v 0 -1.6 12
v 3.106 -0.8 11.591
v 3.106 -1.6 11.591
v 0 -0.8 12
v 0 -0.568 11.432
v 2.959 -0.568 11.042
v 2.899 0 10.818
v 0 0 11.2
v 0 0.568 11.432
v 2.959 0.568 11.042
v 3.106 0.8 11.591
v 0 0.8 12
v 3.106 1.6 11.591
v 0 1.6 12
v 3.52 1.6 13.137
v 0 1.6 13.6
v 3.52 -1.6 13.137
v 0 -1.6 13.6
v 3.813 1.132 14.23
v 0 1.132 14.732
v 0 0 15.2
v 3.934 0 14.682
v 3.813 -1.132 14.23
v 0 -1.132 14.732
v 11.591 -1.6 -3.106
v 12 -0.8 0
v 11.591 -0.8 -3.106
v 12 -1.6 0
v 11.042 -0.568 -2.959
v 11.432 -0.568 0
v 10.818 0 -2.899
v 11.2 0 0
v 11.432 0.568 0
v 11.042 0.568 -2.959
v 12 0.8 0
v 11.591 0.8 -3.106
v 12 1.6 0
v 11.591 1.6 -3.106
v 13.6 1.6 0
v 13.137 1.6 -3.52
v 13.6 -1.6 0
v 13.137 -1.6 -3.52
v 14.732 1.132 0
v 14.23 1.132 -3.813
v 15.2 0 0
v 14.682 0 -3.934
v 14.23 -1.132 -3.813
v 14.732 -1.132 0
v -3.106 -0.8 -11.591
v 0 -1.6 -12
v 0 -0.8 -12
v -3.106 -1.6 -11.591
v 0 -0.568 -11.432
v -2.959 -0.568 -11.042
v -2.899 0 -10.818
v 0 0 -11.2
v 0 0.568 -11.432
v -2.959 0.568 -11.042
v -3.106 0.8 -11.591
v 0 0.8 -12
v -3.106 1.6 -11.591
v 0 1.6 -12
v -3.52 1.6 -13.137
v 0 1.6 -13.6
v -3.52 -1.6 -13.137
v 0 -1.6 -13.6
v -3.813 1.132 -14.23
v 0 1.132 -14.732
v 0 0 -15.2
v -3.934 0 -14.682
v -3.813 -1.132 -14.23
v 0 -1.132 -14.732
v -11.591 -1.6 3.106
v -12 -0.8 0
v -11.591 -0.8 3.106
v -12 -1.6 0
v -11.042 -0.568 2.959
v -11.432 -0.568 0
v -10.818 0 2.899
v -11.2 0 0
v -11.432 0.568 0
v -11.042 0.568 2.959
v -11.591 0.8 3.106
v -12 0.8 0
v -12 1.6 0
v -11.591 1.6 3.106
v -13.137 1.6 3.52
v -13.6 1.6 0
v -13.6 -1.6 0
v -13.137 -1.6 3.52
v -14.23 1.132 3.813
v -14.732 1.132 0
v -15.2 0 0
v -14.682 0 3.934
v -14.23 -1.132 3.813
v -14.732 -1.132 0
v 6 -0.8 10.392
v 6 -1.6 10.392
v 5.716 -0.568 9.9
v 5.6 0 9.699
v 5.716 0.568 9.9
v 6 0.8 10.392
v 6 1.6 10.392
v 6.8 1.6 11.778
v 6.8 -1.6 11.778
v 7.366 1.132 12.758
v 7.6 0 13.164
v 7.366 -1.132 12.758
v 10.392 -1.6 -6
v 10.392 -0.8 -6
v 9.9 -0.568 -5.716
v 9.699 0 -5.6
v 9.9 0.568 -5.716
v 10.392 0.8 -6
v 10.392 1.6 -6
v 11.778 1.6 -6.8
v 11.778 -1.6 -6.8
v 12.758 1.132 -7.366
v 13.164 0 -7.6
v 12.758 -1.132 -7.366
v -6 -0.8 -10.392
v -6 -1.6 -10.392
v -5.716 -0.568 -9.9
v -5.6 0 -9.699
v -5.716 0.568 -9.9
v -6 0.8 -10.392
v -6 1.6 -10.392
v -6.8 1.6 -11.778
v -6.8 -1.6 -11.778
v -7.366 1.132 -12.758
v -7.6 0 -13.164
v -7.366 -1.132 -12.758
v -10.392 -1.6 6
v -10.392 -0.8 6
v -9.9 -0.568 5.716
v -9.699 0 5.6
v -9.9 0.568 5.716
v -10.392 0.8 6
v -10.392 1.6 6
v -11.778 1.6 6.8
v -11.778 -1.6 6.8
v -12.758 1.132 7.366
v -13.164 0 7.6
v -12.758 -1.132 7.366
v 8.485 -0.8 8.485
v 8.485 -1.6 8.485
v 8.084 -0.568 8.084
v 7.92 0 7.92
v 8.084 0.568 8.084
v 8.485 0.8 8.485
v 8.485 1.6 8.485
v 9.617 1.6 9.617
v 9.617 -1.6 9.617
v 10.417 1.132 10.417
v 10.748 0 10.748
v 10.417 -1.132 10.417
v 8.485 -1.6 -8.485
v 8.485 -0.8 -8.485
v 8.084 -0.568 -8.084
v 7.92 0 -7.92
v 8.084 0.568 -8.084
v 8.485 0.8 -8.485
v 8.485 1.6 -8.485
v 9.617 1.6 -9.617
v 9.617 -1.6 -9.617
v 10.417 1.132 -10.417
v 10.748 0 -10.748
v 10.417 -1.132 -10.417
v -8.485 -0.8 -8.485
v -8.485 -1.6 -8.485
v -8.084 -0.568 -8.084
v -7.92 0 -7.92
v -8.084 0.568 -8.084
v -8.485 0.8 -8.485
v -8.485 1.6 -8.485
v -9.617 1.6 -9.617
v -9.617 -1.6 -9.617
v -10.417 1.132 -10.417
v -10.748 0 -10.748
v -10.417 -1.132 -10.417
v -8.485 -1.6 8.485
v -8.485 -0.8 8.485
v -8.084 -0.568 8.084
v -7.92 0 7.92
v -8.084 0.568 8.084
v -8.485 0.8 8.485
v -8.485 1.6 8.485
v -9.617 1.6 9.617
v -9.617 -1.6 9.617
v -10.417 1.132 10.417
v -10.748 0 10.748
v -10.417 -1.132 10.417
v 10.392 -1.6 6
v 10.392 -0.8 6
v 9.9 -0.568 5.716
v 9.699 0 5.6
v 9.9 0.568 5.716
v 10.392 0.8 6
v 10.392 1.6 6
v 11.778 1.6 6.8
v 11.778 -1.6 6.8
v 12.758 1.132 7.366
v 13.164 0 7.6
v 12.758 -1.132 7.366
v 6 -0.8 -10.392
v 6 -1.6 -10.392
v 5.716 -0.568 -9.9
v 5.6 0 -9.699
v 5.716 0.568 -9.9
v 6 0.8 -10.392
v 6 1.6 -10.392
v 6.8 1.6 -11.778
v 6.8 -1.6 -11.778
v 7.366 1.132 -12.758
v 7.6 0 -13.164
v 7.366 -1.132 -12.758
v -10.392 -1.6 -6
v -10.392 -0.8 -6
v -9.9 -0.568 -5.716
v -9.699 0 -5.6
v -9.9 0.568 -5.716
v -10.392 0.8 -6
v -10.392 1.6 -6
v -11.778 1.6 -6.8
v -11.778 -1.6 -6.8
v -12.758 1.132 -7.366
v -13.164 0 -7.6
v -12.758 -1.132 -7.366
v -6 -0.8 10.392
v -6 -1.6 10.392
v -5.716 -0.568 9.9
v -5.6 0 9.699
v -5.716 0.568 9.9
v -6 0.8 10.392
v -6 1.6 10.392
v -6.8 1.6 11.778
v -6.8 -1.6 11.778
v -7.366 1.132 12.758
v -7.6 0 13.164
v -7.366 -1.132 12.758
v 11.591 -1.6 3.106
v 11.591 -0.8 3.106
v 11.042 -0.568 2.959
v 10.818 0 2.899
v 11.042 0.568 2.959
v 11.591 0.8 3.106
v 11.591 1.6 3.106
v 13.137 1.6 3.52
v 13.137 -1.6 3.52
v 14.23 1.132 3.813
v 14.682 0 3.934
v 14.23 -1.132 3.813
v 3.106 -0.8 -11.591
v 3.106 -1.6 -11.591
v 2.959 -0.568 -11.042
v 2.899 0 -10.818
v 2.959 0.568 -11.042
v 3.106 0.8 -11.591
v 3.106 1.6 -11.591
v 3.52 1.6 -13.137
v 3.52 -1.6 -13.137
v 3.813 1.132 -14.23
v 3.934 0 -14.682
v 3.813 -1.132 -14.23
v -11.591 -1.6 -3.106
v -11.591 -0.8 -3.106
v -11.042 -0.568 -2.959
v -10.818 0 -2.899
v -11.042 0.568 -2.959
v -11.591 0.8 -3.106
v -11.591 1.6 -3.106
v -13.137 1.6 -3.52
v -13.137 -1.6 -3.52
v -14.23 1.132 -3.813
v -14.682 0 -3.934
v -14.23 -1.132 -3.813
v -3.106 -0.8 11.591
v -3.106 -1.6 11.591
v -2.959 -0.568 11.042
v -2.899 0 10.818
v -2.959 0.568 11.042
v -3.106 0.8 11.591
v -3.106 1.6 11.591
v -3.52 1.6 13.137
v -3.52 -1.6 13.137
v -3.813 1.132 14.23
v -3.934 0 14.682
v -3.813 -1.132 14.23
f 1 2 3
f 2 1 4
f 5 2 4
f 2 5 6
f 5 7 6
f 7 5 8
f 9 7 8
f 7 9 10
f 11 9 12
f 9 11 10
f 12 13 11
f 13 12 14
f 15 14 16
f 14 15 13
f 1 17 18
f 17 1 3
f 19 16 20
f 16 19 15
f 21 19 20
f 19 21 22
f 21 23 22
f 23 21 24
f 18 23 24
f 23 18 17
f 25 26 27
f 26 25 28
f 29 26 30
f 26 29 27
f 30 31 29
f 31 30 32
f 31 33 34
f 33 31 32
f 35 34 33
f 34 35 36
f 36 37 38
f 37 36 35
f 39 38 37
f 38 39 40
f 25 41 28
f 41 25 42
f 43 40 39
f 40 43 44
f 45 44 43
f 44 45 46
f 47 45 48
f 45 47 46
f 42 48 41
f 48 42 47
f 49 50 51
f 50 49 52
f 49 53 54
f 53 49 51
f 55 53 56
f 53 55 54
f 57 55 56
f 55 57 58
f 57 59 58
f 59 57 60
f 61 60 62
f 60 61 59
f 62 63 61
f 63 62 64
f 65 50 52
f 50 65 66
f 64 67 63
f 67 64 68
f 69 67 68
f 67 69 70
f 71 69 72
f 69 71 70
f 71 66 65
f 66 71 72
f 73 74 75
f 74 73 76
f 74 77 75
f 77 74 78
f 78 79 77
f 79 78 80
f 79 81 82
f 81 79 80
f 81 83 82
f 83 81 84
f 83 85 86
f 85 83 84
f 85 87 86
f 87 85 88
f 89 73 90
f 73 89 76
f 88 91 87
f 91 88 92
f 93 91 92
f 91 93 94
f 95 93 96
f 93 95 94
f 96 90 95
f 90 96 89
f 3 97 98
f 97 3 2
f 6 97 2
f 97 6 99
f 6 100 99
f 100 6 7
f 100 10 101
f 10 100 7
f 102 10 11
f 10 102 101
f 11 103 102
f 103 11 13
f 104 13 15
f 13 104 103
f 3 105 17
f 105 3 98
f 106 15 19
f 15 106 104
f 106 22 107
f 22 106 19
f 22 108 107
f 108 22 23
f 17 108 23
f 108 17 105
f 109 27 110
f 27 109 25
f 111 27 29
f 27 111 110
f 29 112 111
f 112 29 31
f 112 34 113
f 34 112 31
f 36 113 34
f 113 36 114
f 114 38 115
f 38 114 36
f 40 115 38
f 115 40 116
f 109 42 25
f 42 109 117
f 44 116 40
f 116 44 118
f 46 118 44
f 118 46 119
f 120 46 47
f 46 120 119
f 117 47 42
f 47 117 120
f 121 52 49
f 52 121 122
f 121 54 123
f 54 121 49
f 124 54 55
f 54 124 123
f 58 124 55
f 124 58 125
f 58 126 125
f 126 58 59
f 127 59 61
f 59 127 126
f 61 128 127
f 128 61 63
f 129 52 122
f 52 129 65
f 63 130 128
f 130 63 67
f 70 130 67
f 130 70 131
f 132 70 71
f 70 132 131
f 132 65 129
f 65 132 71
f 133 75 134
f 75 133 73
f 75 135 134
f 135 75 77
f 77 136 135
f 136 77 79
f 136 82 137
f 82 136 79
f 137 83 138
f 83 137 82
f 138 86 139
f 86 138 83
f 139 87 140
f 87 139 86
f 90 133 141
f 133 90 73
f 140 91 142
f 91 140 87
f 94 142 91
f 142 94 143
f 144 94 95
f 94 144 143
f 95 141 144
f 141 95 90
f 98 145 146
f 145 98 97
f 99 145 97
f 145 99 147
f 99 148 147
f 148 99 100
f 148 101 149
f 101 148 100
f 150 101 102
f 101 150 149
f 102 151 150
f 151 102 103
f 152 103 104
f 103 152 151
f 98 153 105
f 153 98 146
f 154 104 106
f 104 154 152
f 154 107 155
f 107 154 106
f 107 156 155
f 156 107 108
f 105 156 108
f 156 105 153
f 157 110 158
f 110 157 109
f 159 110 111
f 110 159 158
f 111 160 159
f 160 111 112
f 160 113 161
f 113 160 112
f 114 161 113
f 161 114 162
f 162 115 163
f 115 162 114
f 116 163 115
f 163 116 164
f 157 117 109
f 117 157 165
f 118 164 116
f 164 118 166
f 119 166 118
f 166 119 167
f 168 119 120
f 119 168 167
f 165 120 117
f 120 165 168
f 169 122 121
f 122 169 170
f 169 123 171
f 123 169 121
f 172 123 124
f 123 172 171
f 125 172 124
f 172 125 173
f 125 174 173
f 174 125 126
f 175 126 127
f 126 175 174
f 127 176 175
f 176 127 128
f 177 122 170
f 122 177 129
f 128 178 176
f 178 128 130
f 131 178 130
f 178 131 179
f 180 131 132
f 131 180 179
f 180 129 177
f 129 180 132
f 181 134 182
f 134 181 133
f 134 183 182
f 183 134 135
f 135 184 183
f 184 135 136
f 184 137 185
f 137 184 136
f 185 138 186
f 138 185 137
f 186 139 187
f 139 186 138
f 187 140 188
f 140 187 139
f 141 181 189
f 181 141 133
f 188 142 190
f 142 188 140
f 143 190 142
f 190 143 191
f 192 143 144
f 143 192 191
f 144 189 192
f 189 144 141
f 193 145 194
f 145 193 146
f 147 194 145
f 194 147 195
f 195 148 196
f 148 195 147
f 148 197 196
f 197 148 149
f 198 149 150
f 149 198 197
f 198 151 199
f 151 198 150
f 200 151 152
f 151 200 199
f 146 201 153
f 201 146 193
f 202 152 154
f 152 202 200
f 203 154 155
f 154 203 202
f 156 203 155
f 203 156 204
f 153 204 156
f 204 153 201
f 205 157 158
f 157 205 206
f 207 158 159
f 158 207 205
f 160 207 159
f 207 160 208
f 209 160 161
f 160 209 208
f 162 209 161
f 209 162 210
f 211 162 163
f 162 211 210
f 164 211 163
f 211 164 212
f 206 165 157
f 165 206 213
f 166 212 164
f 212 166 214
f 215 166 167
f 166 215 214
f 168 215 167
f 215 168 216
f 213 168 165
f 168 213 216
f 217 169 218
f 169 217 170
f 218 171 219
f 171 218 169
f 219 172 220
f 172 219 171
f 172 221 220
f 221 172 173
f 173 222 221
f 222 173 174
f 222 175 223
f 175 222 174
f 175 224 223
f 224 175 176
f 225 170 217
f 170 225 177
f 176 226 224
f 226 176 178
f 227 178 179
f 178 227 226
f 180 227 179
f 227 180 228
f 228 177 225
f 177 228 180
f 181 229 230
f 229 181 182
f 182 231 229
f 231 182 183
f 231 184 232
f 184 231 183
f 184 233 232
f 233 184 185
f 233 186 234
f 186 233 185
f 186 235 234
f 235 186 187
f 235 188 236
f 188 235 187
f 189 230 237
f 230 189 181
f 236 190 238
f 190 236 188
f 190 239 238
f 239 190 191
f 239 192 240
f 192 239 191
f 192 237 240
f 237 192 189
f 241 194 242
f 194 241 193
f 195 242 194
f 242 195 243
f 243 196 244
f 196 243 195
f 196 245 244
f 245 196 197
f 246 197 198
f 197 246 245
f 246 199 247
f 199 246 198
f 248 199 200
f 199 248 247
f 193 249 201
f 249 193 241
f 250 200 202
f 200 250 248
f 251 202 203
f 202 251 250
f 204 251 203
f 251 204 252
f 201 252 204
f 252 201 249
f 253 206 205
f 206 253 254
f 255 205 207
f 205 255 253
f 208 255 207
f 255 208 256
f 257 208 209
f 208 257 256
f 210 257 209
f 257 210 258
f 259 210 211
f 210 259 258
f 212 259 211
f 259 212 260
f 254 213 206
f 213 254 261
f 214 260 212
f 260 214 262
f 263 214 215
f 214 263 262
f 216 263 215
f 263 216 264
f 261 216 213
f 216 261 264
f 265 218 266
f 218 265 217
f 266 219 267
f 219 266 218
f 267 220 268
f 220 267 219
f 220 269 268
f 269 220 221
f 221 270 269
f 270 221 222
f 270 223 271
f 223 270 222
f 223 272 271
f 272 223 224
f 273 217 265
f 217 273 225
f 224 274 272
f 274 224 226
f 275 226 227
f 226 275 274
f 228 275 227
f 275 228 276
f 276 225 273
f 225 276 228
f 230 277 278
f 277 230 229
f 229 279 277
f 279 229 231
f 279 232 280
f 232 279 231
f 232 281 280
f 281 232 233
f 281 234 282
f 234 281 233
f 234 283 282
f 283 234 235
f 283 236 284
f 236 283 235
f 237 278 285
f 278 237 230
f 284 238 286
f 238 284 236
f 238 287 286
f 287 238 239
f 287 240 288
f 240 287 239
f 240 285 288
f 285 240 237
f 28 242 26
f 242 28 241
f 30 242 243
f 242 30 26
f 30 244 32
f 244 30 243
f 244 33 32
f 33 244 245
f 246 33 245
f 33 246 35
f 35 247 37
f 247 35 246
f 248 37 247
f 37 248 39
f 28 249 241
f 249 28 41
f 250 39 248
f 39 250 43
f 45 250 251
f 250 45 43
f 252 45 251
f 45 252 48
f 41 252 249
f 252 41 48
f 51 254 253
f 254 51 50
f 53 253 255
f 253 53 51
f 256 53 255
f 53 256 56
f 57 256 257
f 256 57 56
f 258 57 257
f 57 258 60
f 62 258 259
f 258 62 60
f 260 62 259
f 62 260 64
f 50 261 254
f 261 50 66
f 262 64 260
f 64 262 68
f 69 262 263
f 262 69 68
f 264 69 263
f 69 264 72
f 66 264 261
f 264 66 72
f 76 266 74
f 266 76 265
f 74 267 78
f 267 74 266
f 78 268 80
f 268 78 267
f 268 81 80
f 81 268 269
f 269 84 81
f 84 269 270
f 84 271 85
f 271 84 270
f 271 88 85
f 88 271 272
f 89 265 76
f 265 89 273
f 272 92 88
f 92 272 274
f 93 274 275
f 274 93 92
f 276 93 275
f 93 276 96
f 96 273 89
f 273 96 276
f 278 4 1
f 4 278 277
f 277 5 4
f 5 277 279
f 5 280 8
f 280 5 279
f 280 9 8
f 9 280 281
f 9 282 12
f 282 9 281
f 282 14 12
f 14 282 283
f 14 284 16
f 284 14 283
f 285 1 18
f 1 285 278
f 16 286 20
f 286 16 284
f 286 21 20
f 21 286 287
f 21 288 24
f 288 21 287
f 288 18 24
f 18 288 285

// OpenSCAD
// file: ../p/4-4edge.scad
use <../lib.scad>
$fa=1; $fs=0.2;
function ldraw_lib__4_4edge(realsolid=false) = [
// 0 Circle 1.0
// 0 Name: 4-4edge.dat
// 0 Author: James Jessiman
// 0 !LDRAW_ORG Primitive UPDATE 2017-01
// 0 !LICENSE Licensed under CC BY 2.0 and CC BY 4.0 : see CAreadme.txt
// 
// 0 BFC CERTIFY CCW
  [0,"BFC","CERTIFY"],
  [0,"BFC","CCW"],
// 
// 0 !HISTORY 1998-12-15 [PTadmin] Official Update 1998-10
// 0 !HISTORY 2005-12-28 [PTadmin] Official Update 2005-01
// 0 !HISTORY 2007-06-24 [PTadmin] Header formatted for Contributor Agreement
// 0 !HISTORY 2008-07-01 [PTadmin] Official Update 2008-01
// 0 !HISTORY 2017-01-15 [Steffen] BFCed
// 0 !HISTORY 2017-12-30 [PTadmin] Official Update 2017-01
// 
// 
// 2 24 1 0 0 0.9239 0 0.3827
  [2,24,1,0,0,0.9239,0,0.3827],
// 2 24 0.9239 0 0.3827 0.7071 0 0.7071
  [2,24,0.9239,0,0.3827,0.7071,0,0.7071],
// 2 24 0.7071 0 0.7071 0.3827 0 0.9239
  [2,24,0.7071,0,0.7071,0.3827,0,0.9239],
// 2 24 0.3827 0 0.9239 0 0 1
  [2,24,0.3827,0,0.9239,0,0,1],
// 2 24 0 0 1 -0.3827 0 0.9239
  [2,24,0,0,1,-0.3827,0,0.9239],
// 2 24 -0.3827 0 0.9239 -0.7071 0 0.7071
  [2,24,-0.3827,0,0.9239,-0.7071,0,0.7071],
// 2 24 -0.7071 0 0.7071 -0.9239 0 0.3827
  [2,24,-0.7071,0,0.7071,-0.9239,0,0.3827],
// 2 24 -0.9239 0 0.3827 -1 0 -0
  [2,24,-0.9239,0,0.3827,-1,0,-0],
// 2 24 -1 0 -0 -0.9239 0 -0.3827
  [2,24,-1,0,-0,-0.9239,0,-0.3827],
// 2 24 -0.9239 0 -0.3827 -0.7071 0 -0.7071
  [2,24,-0.9239,0,-0.3827,-0.7071,0,-0.7071],
// 2 24 -0.7071 0 -0.7071 -0.3827 0 -0.9239
  [2,24,-0.7071,0,-0.7071,-0.3827,0,-0.9239],
// 2 24 -0.3827 0 -0.9239 0 0 -1
  [2,24,-0.3827,0,-0.9239,0,0,-1],
// 2 24 0 0 -1 0.3827 0 -0.9239
  [2,24,0,0,-1,0.3827,0,-0.9239],
// 2 24 0.3827 0 -0.9239 0.7071 0 -0.7071
  [2,24,0.3827,0,-0.9239,0.7071,0,-0.7071],
// 2 24 0.7071 0 -0.7071 0.9239 0 -0.3827
  [2,24,0.7071,0,-0.7071,0.9239,0,-0.3827],
// 2 24 0.9239 0 -0.3827 1 0 0
  [2,24,0.9239,0,-0.3827,1,0,0],
];
module ldraw_lib__4_4edge(step=0, col=false, unit=2/5, alt=false, line=0.2, solid=!$preview)
    makepoly(ldraw_lib__4_4edge(solid), step=step, col=col, unit=unit, alt=alt, line=line, solid=solid);
ldraw_lib__4_4edge(line=0.2);
// file: ../p/4-4disc.scad
use <../lib.scad>
$fa=1; $fs=0.2;
function ldraw_lib__4_4disc(realsolid=false) = [
// 0 Disc 1.0
// 0 Name: 4-4disc.dat
// 0 Author: James Jessiman
// 0 !LDRAW_ORG Primitive UPDATE 2002-02
// 0 !LICENSE Licensed under CC BY 2.0 and CC BY 4.0 : see CAreadme.txt
// 
// 0 BFC CERTIFY CCW
  [0,"BFC","CERTIFY"],
  [0,"BFC","CCW"],
// 
// 0 !HISTORY 1998-12-15 [PTadmin] Official Update 1998-10
// 0 !HISTORY 2002-03-23 [sbliss] Added BFC statement
// 0 !HISTORY 2002-04-25 [PTadmin] Official Update 2002-02
// 0 !HISTORY 2007-06-24 [PTadmin] Header formatted for Contributor Agreement
// 0 !HISTORY 2008-07-01 [PTadmin] Official Update 2008-01
// 
// 
// 3 16 0 0 0 1 0 0 0.9239 0 0.3827
  [3,16,0,0,0,1,0,0,0.9239,0,0.3827],
// 3 16 0 0 0 0.9239 0 0.3827 0.7071 0 0.7071
  [3,16,0,0,0,0.9239,0,0.3827,0.7071,0,0.7071],
// 3 16 0 0 0 0.7071 0 0.7071 0.3827 0 0.9239
  [3,16,0,0,0,0.7071,0,0.7071,0.3827,0,0.9239],
// 3 16 0 0 0 0.3827 0 0.9239 0 0 1
  [3,16,0,0,0,0.3827,0,0.9239,0,0,1],
// 3 16 0 0 0 0 0 1 -0.3827 0 0.9239
  [3,16,0,0,0,0,0,1,-0.3827,0,0.9239],
// 3 16 0 0 0 -0.3827 0 0.9239 -0.7071 0 0.7071
  [3,16,0,0,0,-0.3827,0,0.9239,-0.7071,0,0.7071],
// 3 16 0 0 0 -0.7071 0 0.7071 -0.9239 0 0.3827
  [3,16,0,0,0,-0.7071,0,0.7071,-0.9239,0,0.3827],
// 3 16 0 0 0 -0.9239 0 0.3827 -1 0 -0
  [3,16,0,0,0,-0.9239,0,0.3827,-1,0,-0],
// 3 16 0 0 0 -1 0 -0 -0.9239 0 -0.3827
  [3,16,0,0,0,-1,0,-0,-0.9239,0,-0.3827],
// 3 16 0 0 0 -0.9239 0 -0.3827 -0.7071 0 -0.7071
  [3,16,0,0,0,-0.9239,0,-0.3827,-0.7071,0,-0.7071],
// 3 16 0 0 0 -0.7071 0 -0.7071 -0.3827 0 -0.9239
  [3,16,0,0,0,-0.7071,0,-0.7071,-0.3827,0,-0.9239],
// 3 16 0 0 0 -0.3827 0 -0.9239 0 0 -1
  [3,16,0,0,0,-0.3827,0,-0.9239,0,0,-1],
// 3 16 0 0 0 0 0 -1 0.3827 0 -0.9239
  [3,16,0,0,0,0,0,-1,0.3827,0,-0.9239],
// 3 16 0 0 0 0.3827 0 -0.9239 0.7071 0 -0.7071
  [3,16,0,0,0,0.3827,0,-0.9239,0.7071,0,-0.7071],
// 3 16 0 0 0 0.7071 0 -0.7071 0.9239 0 -0.3827
  [3,16,0,0,0,0.7071,0,-0.7071,0.9239,0,-0.3827],
// 3 16 0 0 0 0.9239 0 -0.3827 1 0 0
  [3,16,0,0,0,0.9239,0,-0.3827,1,0,0],
// 0
];
module ldraw_lib__4_4disc(step=0, col=false, unit=2/5, alt=false, line=0.2, solid=!$preview)
    makepoly(ldraw_lib__4_4disc(solid), step=step, col=col, unit=unit, alt=alt, line=line, solid=solid);
ldraw_lib__4_4disc(line=0.2);
// file: ../p/4-4cyli.scad
use <../lib.scad>
$fa=1; $fs=0.2;
function ldraw_lib__4_4cyli(realsolid=false) = [
// 0 Cylinder 1.0
// 0 Name: 4-4cyli.dat
// 0 Author: James Jessiman
// 0 !LDRAW_ORG Primitive UPDATE 2005-01
// 0 !LICENSE Licensed under CC BY 2.0 and CC BY 4.0 : see CAreadme.txt
// 
// 0 BFC CERTIFY CCW
  [0,"BFC","CERTIFY"],
  [0,"BFC","CCW"],
// 
// 0 !HISTORY 1998-12-15 [PTadmin] Official Update 1998-10
// 0 !HISTORY 2002-03-23 [sbliss] Added BFC statement; merged headers from files in distributions LDraw 0.27 and Complete.
// 0 !HISTORY 2002-04-25 [PTadmin] Official Update 2002-02
// 0 !HISTORY 2004-12-14 [guyvivan] BFC CCW
// 0 !HISTORY 2005-12-28 [PTadmin] Official Update 2005-01
// 0 !HISTORY 2007-06-24 [PTadmin] Header formatted for Contributor Agreement
// 0 !HISTORY 2008-07-01 [PTadmin] Official Update 2008-01
// 
// 
// 4 16 1 1 0 0.9239 1 0.3827 0.9239 0 0.3827 1 0 0
  [4,16,1,1,0,0.9239,1,0.3827,0.9239,0,0.3827,1,0,0],
// 5 24 1 0 0 1 1 0 0.9239 0 0.3827 0.9239 0 -0.3827
  [5,24,1,0,0,1,1,0,0.9239,0,0.3827,0.9239,0,-0.3827],
// 4 16 0.9239 1 0.3827 0.7071 1 0.7071 0.7071 0 0.7071 0.9239 0 0.3827
  [4,16,0.9239,1,0.3827,0.7071,1,0.7071,0.7071,0,0.7071,0.9239,0,0.3827],
// 5 24 0.9239 0 0.3827 0.9239 1 0.3827 0.7071 0 0.7071 1 0 0
  [5,24,0.9239,0,0.3827,0.9239,1,0.3827,0.7071,0,0.7071,1,0,0],
// 4 16 0.7071 1 0.7071 0.3827 1 0.9239 0.3827 0 0.9239 0.7071 0 0.7071
  [4,16,0.7071,1,0.7071,0.3827,1,0.9239,0.3827,0,0.9239,0.7071,0,0.7071],
// 5 24 0.7071 0 0.7071 0.7071 1 0.7071 0.3827 0 0.9239 0.9239 0 0.3827
  [5,24,0.7071,0,0.7071,0.7071,1,0.7071,0.3827,0,0.9239,0.9239,0,0.3827],
// 4 16 0.3827 1 0.9239 0 1 1 0 0 1 0.3827 0 0.9239
  [4,16,0.3827,1,0.9239,0,1,1,0,0,1,0.3827,0,0.9239],
// 5 24 0.3827 0 0.9239 0.3827 1 0.9239 0 0 1 0.7071 0 0.7071
  [5,24,0.3827,0,0.9239,0.3827,1,0.9239,0,0,1,0.7071,0,0.7071],
// 4 16 0 1 1 -0.3827 1 0.9239 -0.3827 0 0.9239 0 0 1
  [4,16,0,1,1,-0.3827,1,0.9239,-0.3827,0,0.9239,0,0,1],
// 5 24 0 0 1 0 1 1 -0.3827 0 0.9239 0.3827 0 0.9239
  [5,24,0,0,1,0,1,1,-0.3827,0,0.9239,0.3827,0,0.9239],
// 4 16 -0.3827 1 0.9239 -0.7071 1 0.7071 -0.7071 0 0.7071 -0.3827 0 0.9239
  [4,16,-0.3827,1,0.9239,-0.7071,1,0.7071,-0.7071,0,0.7071,-0.3827,0,0.9239],
// 5 24 -0.3827 0 0.9239 -0.3827 1 0.9239 -0.7071 0 0.7071 0 0 1
  [5,24,-0.3827,0,0.9239,-0.3827,1,0.9239,-0.7071,0,0.7071,0,0,1],
// 4 16 -0.7071 1 0.7071 -0.9239 1 0.3827 -0.9239 0 0.3827 -0.7071 0 0.7071
  [4,16,-0.7071,1,0.7071,-0.9239,1,0.3827,-0.9239,0,0.3827,-0.7071,0,0.7071],
// 5 24 -0.7071 0 0.7071 -0.7071 1 0.7071 -0.9239 0 0.3827 -0.3827 0 0.9239
  [5,24,-0.7071,0,0.7071,-0.7071,1,0.7071,-0.9239,0,0.3827,-0.3827,0,0.9239],
// 4 16 -0.9239 1 0.3827 -1 1 0 -1 0 0 -0.9239 0 0.3827
  [4,16,-0.9239,1,0.3827,-1,1,0,-1,0,0,-0.9239,0,0.3827],
// 5 24 -0.9239 0 0.3827 -0.9239 1 0.3827 -1 0 0 -0.7071 0 0.7071
  [5,24,-0.9239,0,0.3827,-0.9239,1,0.3827,-1,0,0,-0.7071,0,0.7071],
// 4 16 -1 1 0 -0.9239 1 -0.3827 -0.9239 0 -0.3827 -1 0 0
  [4,16,-1,1,0,-0.9239,1,-0.3827,-0.9239,0,-0.3827,-1,0,0],
// 5 24 -1 0 0 -1 1 0 -0.9239 0 -0.3827 -0.9239 0 0.3827
  [5,24,-1,0,0,-1,1,0,-0.9239,0,-0.3827,-0.9239,0,0.3827],
// 4 16 -0.9239 1 -0.3827 -0.7071 1 -0.7071 -0.7071 0 -0.7071 -0.9239 0 -0.3827
  [4,16,-0.9239,1,-0.3827,-0.7071,1,-0.7071,-0.7071,0,-0.7071,-0.9239,0,-0.3827],
// 5 24 -0.9239 0 -0.3827 -0.9239 1 -0.3827 -0.7071 0 -0.7071 -1 0 0
  [5,24,-0.9239,0,-0.3827,-0.9239,1,-0.3827,-0.7071,0,-0.7071,-1,0,0],
// 4 16 -0.7071 1 -0.7071 -0.3827 1 -0.9239 -0.3827 0 -0.9239 -0.7071 0 -0.7071
  [4,16,-0.7071,1,-0.7071,-0.3827,1,-0.9239,-0.3827,0,-0.9239,-0.7071,0,-0.7071],
// 5 24 -0.7071 0 -0.7071 -0.7071 1 -0.7071 -0.3827 0 -0.9239 -0.9239 0 -0.3827
  [5,24,-0.7071,0,-0.7071,-0.7071,1,-0.7071,-0.3827,0,-0.9239,-0.9239,0,-0.3827],
// 4 16 -0.3827 1 -0.9239 0 1 -1 0 0 -1 -0.3827 0 -0.9239
  [4,16,-0.3827,1,-0.9239,0,1,-1,0,0,-1,-0.3827,0,-0.9239],
// 5 24 -0.3827 0 -0.9239 -0.3827 1 -0.9239 0 0 -1 -0.7071 0 -0.7071
  [5,24,-0.3827,0,-0.9239,-0.3827,1,-0.9239,0,0,-1,-0.7071,0,-0.7071],
// 4 16 0 1 -1 0.3827 1 -0.9239 0.3827 0 -0.9239 0 0 -1
  [4,16,0,1,-1,0.3827,1,-0.9239,0.3827,0,-0.9239,0,0,-1],
// 5 24 0 0 -1 0 1 -1 0.3827 0 -0.9239 -0.3827 0 -0.9239
  [5,24,0,0,-1,0,1,-1,0.3827,0,-0.9239,-0.3827,0,-0.9239],
// 4 16 0.3827 1 -0.9239 0.7071 1 -0.7071 0.7071 0 -0.7071 0.3827 0 -0.9239
  [4,16,0.3827,1,-0.9239,0.7071,1,-0.7071,0.7071,0,-0.7071,0.3827,0,-0.9239],
// 5 24 0.3827 0 -0.9239 0.3827 1 -0.9239 0.7071 0 -0.7071 0 0 -1
  [5,24,0.3827,0,-0.9239,0.3827,1,-0.9239,0.7071,0,-0.7071,0,0,-1],
// 4 16 0.7071 1 -0.7071 0.9239 1 -0.3827 0.9239 0 -0.3827 0.7071 0 -0.7071
  [4,16,0.7071,1,-0.7071,0.9239,1,-0.3827,0.9239,0,-0.3827,0.7071,0,-0.7071],
// 5 24 0.7071 0 -0.7071 0.7071 1 -0.7071 0.9239 0 -0.3827 0.3827 0 -0.9239
  [5,24,0.7071,0,-0.7071,0.7071,1,-0.7071,0.9239,0,-0.3827,0.3827,0,-0.9239],
// 4 16 0.9239 1 -0.3827 1 1 0 1 0 0 0.9239 0 -0.3827
  [4,16,0.9239,1,-0.3827,1,1,0,1,0,0,0.9239,0,-0.3827],
// 5 24 0.9239 0 -0.3827 0.9239 1 -0.3827 1 0 0 0.7071 0 -0.7071
  [5,24,0.9239,0,-0.3827,0.9239,1,-0.3827,1,0,0,0.7071,0,-0.7071],
// 0
];
module ldraw_lib__4_4cyli(step=0, col=false, unit=2/5, alt=false, line=0.2, solid=!$preview)
    makepoly(ldraw_lib__4_4cyli(solid), step=step, col=col, unit=unit, alt=alt, line=line, solid=solid);
ldraw_lib__4_4cyli(line=0.2);
// file: ../p/stud3.scad
use <../lib.scad>
use <4-4cyli.scad>
use <4-4disc.scad>
use <4-4edge.scad>
$fa=1; $fs=0.2;
function ldraw_lib__stud3(realsolid=false) = realsolid ? 
    [openscad(translate([0,0,-eps()], o=cylinder(4+eps(), r=4)),2)] : [
// 0 Stud Tube Solid
// 0 Name: stud3.dat
// 0 Author: James Jessiman
// 0 !LDRAW_ORG Primitive UPDATE 2012-01
// 0 !LICENSE Licensed under CC BY 2.0 and CC BY 4.0 : see CAreadme.txt
// 
// 0 BFC CERTIFY CCW
  [0,"BFC","CERTIFY"],
  [0,"BFC","CCW"],
// 
// 0 !HISTORY 2002-04-04 [sbliss] Modified for BFC compliance
// 0 !HISTORY 2002-04-25 [PTadmin] Official Update 2002-02
// 0 !HISTORY 2007-06-24 [PTadmin] Header formatted for Contributor Agreement
// 0 !HISTORY 2008-07-01 [PTadmin] Official Update 2008-01
// 0 !HISTORY 2012-02-16 [Philo] Changed to CCW
// 0 !HISTORY 2012-03-30 [PTadmin] Official Update 2012-01
// 
// 
// 1 16 0 -4 0 4 0 0 0 1 0 0 0 4 4-4edge.dat
  [1,16,0,-4,0,4,0,0,0,1,0,0,0,4, ldraw_lib__4_4edge(realsolid)],
// 1 16 0 0 0 4 0 0 0 1 0 0 0 4 4-4edge.dat
  [1,16,0,0,0,4,0,0,0,1,0,0,0,4, ldraw_lib__4_4edge(realsolid)],
// 1 16 0 -4 0 4 0 0 0 1 0 0 0 4 4-4disc.dat
  [1,16,0,-4,0,4,0,0,0,1,0,0,0,4, ldraw_lib__4_4disc(realsolid)],
// 1 16 0 -4 0 4 0 0 0 4 0 0 0 4 4-4cyli.dat
  [1,16,0,-4,0,4,0,0,0,4,0,0,0,4, ldraw_lib__4_4cyli(realsolid)],
];
module ldraw_lib__stud3(step=0, col=false, unit=2/5, alt=false, line=0.2, solid=!$preview)
    makepoly(ldraw_lib__stud3(solid), step=step, col=col, unit=unit, alt=alt, line=line, solid=solid);
ldraw_lib__stud3(line=0.2);
// file: ../p/stud.scad
use <../lib.scad>
use <4-4cyli.scad>
use <4-4disc.scad>
use <4-4edge.scad>
$fa=1; $fs=0.2;
function ldraw_lib__stud(realsolid=false) = realsolid ? 
    [openscad(translate([0,0,-eps()], o=cylinder(4+eps(), r=6)),2)] : [
// 0 Stud
// 0 Name: stud.dat
// 0 Author: James Jessiman
// 0 !LDRAW_ORG Primitive UPDATE 2012-01
// 0 !LICENSE Licensed under CC BY 2.0 and CC BY 4.0 : see CAreadme.txt
// 
// 0 BFC CERTIFY CCW
  [0,"BFC","CERTIFY"],
  [0,"BFC","CCW"],
// 
// 0 !HISTORY 2002-04-04 [sbliss] Modified for BFC compliance
// 0 !HISTORY 2002-04-25 [PTadmin] Official Update 2002-02
// 0 !HISTORY 2007-06-24 [PTadmin] Header formatted for Contributor Agreement
// 0 !HISTORY 2008-07-01 [PTadmin] Official Update 2008-01
// 0 !HISTORY 2012-02-16 [Philo] Changed to CCW
// 0 !HISTORY 2012-03-30 [PTadmin] Official Update 2012-01
// 
// 
// 1 16 0 0 0 6 0 0 0 1 0 0 0 6 4-4edge.dat
  [1,16,0,0,0,6,0,0,0,1,0,0,0,6, ldraw_lib__4_4edge(realsolid)],
// 1 16 0 -4 0 6 0 0 0 1 0 0 0 6 4-4edge.dat
  [1,16,0,-4,0,6,0,0,0,1,0,0,0,6, ldraw_lib__4_4edge(realsolid)],
// 1 16 0 0 0 6 0 0 0 -4 0 0 0 6 4-4cyli.dat
  [1,16,0,0,0,6,0,0,0,-4,0,0,0,6, ldraw_lib__4_4cyli(realsolid)],
// 1 16 0 -4 0 6 0 0 0 1 0 0 0 6 4-4disc.dat
  [1,16,0,-4,0,6,0,0,0,1,0,0,0,6, ldraw_lib__4_4disc(realsolid)],
];
module ldraw_lib__stud(step=0, col=false, unit=2/5, alt=false, line=0.2, solid=!$preview)
    makepoly(ldraw_lib__stud(solid), step=step, col=col, unit=unit, alt=alt, line=line, solid=solid);
ldraw_lib__stud(line=0.2);
// file: ../p/box5.scad
use <../lib.scad>
$fa=1; $fs=0.2;
function ldraw_lib__box5(realsolid=false) = [
// 0 Box with 5 Faces and All Edges
// 0 Name: box5.dat
// 0 Author: James Jessiman
// 0 !LDRAW_ORG Primitive UPDATE 2012-01
// 0 !LICENSE Licensed under CC BY 2.0 and CC BY 4.0 : see CAreadme.txt
// 
// 0 BFC CERTIFY CCW
  [0,"BFC","CERTIFY"],
  [0,"BFC","CCW"],
// 
// 0 !HISTORY 2002-04-03 [sbliss] Modified for BFC compliance
// 0 !HISTORY 2002-04-25 [PTadmin] Official Update 2002-02
// 0 !HISTORY 2007-06-24 [PTadmin] Header formatted for Contributor Agreement
// 0 !HISTORY 2008-07-01 [PTadmin] Official Update 2008-01
// 0 !HISTORY 2012-02-16 [Philo] Changed to CCW
// 0 !HISTORY 2012-03-30 [PTadmin] Official Update 2012-01
// 
// 
// 2 24 1 1 1 -1 1 1
  [2,24,1,1,1,-1,1,1],
// 2 24 -1 1 1 -1 1 -1
  [2,24,-1,1,1,-1,1,-1],
// 2 24 -1 1 -1 1 1 -1
  [2,24,-1,1,-1,1,1,-1],
// 2 24 1 1 -1 1 1 1
  [2,24,1,1,-1,1,1,1],
// 2 24 1 0 1 -1 0 1
  [2,24,1,0,1,-1,0,1],
// 2 24 -1 0 1 -1 0 -1
  [2,24,-1,0,1,-1,0,-1],
// 2 24 -1 0 -1 1 0 -1
  [2,24,-1,0,-1,1,0,-1],
// 2 24 1 0 -1 1 0 1
  [2,24,1,0,-1,1,0,1],
// 2 24 1 0 1 1 1 1
  [2,24,1,0,1,1,1,1],
// 2 24 -1 0 1 -1 1 1
  [2,24,-1,0,1,-1,1,1],
// 2 24 1 0 -1 1 1 -1
  [2,24,1,0,-1,1,1,-1],
// 2 24 -1 0 -1 -1 1 -1
  [2,24,-1,0,-1,-1,1,-1],
// 4 16 -1 1 1 1 1 1 1 1 -1 -1 1 -1
  [4,16,-1,1,1,1,1,1,1,1,-1,-1,1,-1],
// 4 16 -1 1 1 -1 0 1 1 0 1 1 1 1
  [4,16,-1,1,1,-1,0,1,1,0,1,1,1,1],
// 4 16 -1 1 -1 -1 0 -1 -1 0 1 -1 1 1
  [4,16,-1,1,-1,-1,0,-1,-1,0,1,-1,1,1],
// 4 16 1 1 -1 1 0 -1 -1 0 -1 -1 1 -1
  [4,16,1,1,-1,1,0,-1,-1,0,-1,-1,1,-1],
// 4 16 1 1 1 1 0 1 1 0 -1 1 1 -1
  [4,16,1,1,1,1,0,1,1,0,-1,1,1,-1],
];
module ldraw_lib__box5(step=0, col=false, unit=2/5, alt=false, line=0.2, solid=!$preview)
    makepoly(ldraw_lib__box5(solid), step=step, col=col, unit=unit, alt=alt, line=line, solid=solid);
ldraw_lib__box5(line=0.2);
// file: ../p/box4t.scad
use <../lib.scad>
$fa=1; $fs=0.2;
function ldraw_lib__box4t(realsolid=false) = [
// 0 Box with 4 Adjacent Faces and All Edges
// 0 Name: box4t.dat
// 0 Author: Tore Eriksson [Tore_Eriksson]
// 0 !LDRAW_ORG Primitive UPDATE 2003-02
// 0 !LICENSE Licensed under CC BY 2.0 and CC BY 4.0 : see CAreadme.txt
// 
// 0 BFC CERTIFY CCW
  [0,"BFC","CERTIFY"],
  [0,"BFC","CCW"],
// 
// 0 !HISTORY 1997-09-29 [PTadmin] Official Update 1997-15
// 0 !HISTORY 2002-08-31 [izanette] Modified with WINDZ for BFC compliance
// 0 !HISTORY 2003-08-01 [PTadmin] Official Update 2003-02
// 0 !HISTORY 2007-06-24 [PTadmin] Header formatted for Contributor Agreement
// 0 !HISTORY 2008-07-01 [PTadmin] Official Update 2008-01
// 
// 
// 2 24 1 1 1 -1 1 1
  [2,24,1,1,1,-1,1,1],
// 2 24 -1 1 1 -1 1 -1
  [2,24,-1,1,1,-1,1,-1],
// 2 24 -1 1 -1 1 1 -1
  [2,24,-1,1,-1,1,1,-1],
// 2 24 1 1 -1 1 1 1
  [2,24,1,1,-1,1,1,1],
// 2 24 1 0 1 -1 0 1
  [2,24,1,0,1,-1,0,1],
// 2 24 -1 0 1 -1 0 -1
  [2,24,-1,0,1,-1,0,-1],
// 2 24 -1 0 -1 1 0 -1
  [2,24,-1,0,-1,1,0,-1],
// 2 24 1 0 -1 1 0 1
  [2,24,1,0,-1,1,0,1],
// 2 24 1 0 1 1 1 1
  [2,24,1,0,1,1,1,1],
// 2 24 -1 0 1 -1 1 1
  [2,24,-1,0,1,-1,1,1],
// 2 24 1 0 -1 1 1 -1
  [2,24,1,0,-1,1,1,-1],
// 2 24 -1 0 -1 -1 1 -1
  [2,24,-1,0,-1,-1,1,-1],
// 4 16 1 1 1 1 1 -1 -1 1 -1 -1 1 1
  [4,16,1,1,1,1,1,-1,-1,1,-1,-1,1,1],
// 4 16 1 1 1 -1 1 1 -1 0 1 1 0 1
  [4,16,1,1,1,-1,1,1,-1,0,1,1,0,1],
// 4 16 -1 1 1 -1 1 -1 -1 0 -1 -1 0 1
  [4,16,-1,1,1,-1,1,-1,-1,0,-1,-1,0,1],
// 0 4 16 -1 1 -1 -1 0 -1 1 0 -1 1 1 -1
// 4 16 1 1 -1 1 1 1 1 0 1 1 0 -1
  [4,16,1,1,-1,1,1,1,1,0,1,1,0,-1],
// 0
];
module ldraw_lib__box4t(step=0, col=false, unit=2/5, alt=false, line=0.2, solid=!$preview)
    makepoly(ldraw_lib__box4t(solid), step=step, col=col, unit=unit, alt=alt, line=line, solid=solid);
ldraw_lib__box4t(line=0.2);
// file: s/3004s01.scad
use <../../lib.scad>
use <../../p/box4t.scad>
use <../../p/box5.scad>
use <../../p/stud.scad>
use <../../p/stud3.scad>
$fa=1; $fs=0.2;
function ldraw_lib__s__3004s01(realsolid=false) = [
// 0 ~Brick  1 x  2 without Front Face
// 0 Name: s\3004s01.dat
// 0 Author: James Jessiman
// 0 !LDRAW_ORG Subpart UPDATE 2003-03
// 0 !LICENSE Licensed under CC BY 2.0 and CC BY 4.0 : see CAreadme.txt
// 
// 0 BFC CERTIFY CCW
  [0,"BFC","CERTIFY"],
  [0,"BFC","CCW"],
// 
// 0 !HISTORY 2003-09-07 [jriley] Subfiling, BFC
// 0 !HISTORY 2003-12-19 [PTadmin] Official Update 2003-03
// 0 !HISTORY 2007-08-29 [PTadmin] Header formatted for Contributor Agreement
// 0 !HISTORY 2008-07-01 [PTadmin] Official Update 2008-01
// 
// 
// 1 16 0 4 0 1 0 0 0 -5 0 0 0 1 stud3.dat
  [1,16,0,4,0,1,0,0,0,-5,0,0,0,1, ldraw_lib__stud3(realsolid)],
// 0 BFC INVERTNEXT
  [0,"BFC","INVERTNEXT"],
// 1 16 0 24 0 16 0 0 0 -20 0 0 0 6 box5.dat
  [1,16,0,24,0,16,0,0,0,-20,0,0,0,6, ldraw_lib__box5(realsolid)],
// 4 16 20 24 10 16 24 6 -16 24 6 -20 24 10
  [4,16,20,24,10,16,24,6,-16,24,6,-20,24,10],
// 4 16 -20 24 10 -16 24 6 -16 24 -6 -20 24 -10
  [4,16,-20,24,10,-16,24,6,-16,24,-6,-20,24,-10],
// 4 16 -20 24 -10 -16 24 -6 16 24 -6 20 24 -10
  [4,16,-20,24,-10,-16,24,-6,16,24,-6,20,24,-10],
// 4 16 20 24 -10 16 24 -6 16 24 6 20 24 10
  [4,16,20,24,-10,16,24,-6,16,24,6,20,24,10],
// 1 16 0 24 0 20 0 0 0 -24 0 0 0 10 box4t.dat
  [1,16,0,24,0,20,0,0,0,-24,0,0,0,10, ldraw_lib__box4t(realsolid)],
// 1 16 10 0 0 1 0 0 0 1 0 0 0 1 stud.dat
  [1,16,10,0,0,1,0,0,0,1,0,0,0,1, ldraw_lib__stud(realsolid)],
// 1 16 -10 0 0 1 0 0 0 1 0 0 0 1 stud.dat
  [1,16,-10,0,0,1,0,0,0,1,0,0,0,1, ldraw_lib__stud(realsolid)],
// 0
];
module ldraw_lib__s__3004s01(step=0, col=false, unit=2/5, alt=false, line=0.2, solid=!$preview)
    makepoly(ldraw_lib__s__3004s01(solid), step=step, col=col, unit=unit, alt=alt, line=line, solid=solid);
ldraw_lib__s__3004s01(line=0.2);
// file: s/2815s01.scad
use <../../lib.scad>
$fa=1; $fs=0.2;
function ldraw_lib__s__2815s01(realsolid=false) = [
// 0 ~Technic Wedge Belt Wheel Tyre Segment
// 0 Name: s\2815s01.dat
// 0 Author: Guy Vivan [guyvivan]
// 0 !LDRAW_ORG Subpart UPDATE 2012-01
// 0 !LICENSE Licensed under CC BY 2.0 and CC BY 4.0 : see CAreadme.txt
// 
// 0 BFC CERTIFY CCW
  [0,"BFC","CERTIFY"],
  [0,"BFC","CCW"],
// 
// 0 !HISTORY 2012-01-22 [Philo] Increased precision for better smoothing
// 0 !HISTORY 2012-03-30 [PTadmin] Official Update 2012-01
// 
// 
// 2 24 7.76457 -28.97778 -2 0 -30 -2
  [2,24,7.76457,-28.97778,-2,0,-30,-2],
// 2 24 7.76457 -28.97778 2 0 -30 2
  [2,24,7.76457,-28.97778,2,0,-30,2],
// 4 16 7.76457 -28.97778 -4 0 -30 -4 0 -30 -2 7.76457 -28.97778 -2
  [4,16,7.76457,-28.97778,-4,0,-30,-4,0,-30,-2,7.76457,-28.97778,-2],
// 4 16 7.76457 -28.97778 -2 0 -30 -2 0 -28.58 -1.42 7.397047 -27.60617 -1.42
  [4,16,7.76457,-28.97778,-2,0,-30,-2,0,-28.58,-1.42,7.397047,-27.60617,-1.42],
// 4 16 7.397047 -27.60617 -1.42 0 -28.58 -1.42 0 -28 0 7.246932 -27.04593 0
  [4,16,7.397047,-27.60617,-1.42,0,-28.58,-1.42,0,-28,0,7.246932,-27.04593,0],
// 4 16 7.246932 -27.04593 0 0 -28 0 0 -28.58 1.42 7.397047 -27.60617 1.42
  [4,16,7.246932,-27.04593,0,0,-28,0,0,-28.58,1.42,7.397047,-27.60617,1.42],
// 4 16 7.397047 -27.60617 1.42 0 -28.58 1.42 0 -30 2 7.76457 -28.97778 2
  [4,16,7.397047,-27.60617,1.42,0,-28.58,1.42,0,-30,2,7.76457,-28.97778,2],
// 4 16 7.76457 -28.97778 2 0 -30 2 0 -30 4 7.76457 -28.97778 4
  [4,16,7.76457,-28.97778,2,0,-30,2,0,-30,4,7.76457,-28.97778,4],
// 5 24 7.397047 -27.60617 -1.42 0 -28.58 -1.42 7.76457 -28.97778 -2 7.246932 -27.04593 0
  [5,24,7.397047,-27.60617,-1.42,0,-28.58,-1.42,7.76457,-28.97778,-2,7.246932,-27.04593,0],
// 5 24 7.246932 -27.04593 0 0 -28 0 7.397047 -27.60617 -1.42 7.397047 -27.60617 1.42
  [5,24,7.246932,-27.04593,0,0,-28,0,7.397047,-27.60617,-1.42,7.397047,-27.60617,1.42],
// 5 24 7.397047 -27.60617 1.42 0 -28.58 1.42 7.246932 -27.04593 0 7.76457 -28.97778 2
  [5,24,7.397047,-27.60617,1.42,0,-28.58,1.42,7.246932,-27.04593,0,7.76457,-28.97778,2],
// 2 24 7.76457 -28.97778 -4 0 -30 -4
  [2,24,7.76457,-28.97778,-4,0,-30,-4],
// 2 24 7.76457 -28.97778 4 0 -30 4
  [2,24,7.76457,-28.97778,4,0,-30,4],
// 4 16 7.76457 -28.97778 4 0 -30 4 0 -34 4 8.799846 -32.84148 4
  [4,16,7.76457,-28.97778,4,0,-30,4,0,-34,4,8.799846,-32.84148,4],
// 5 24 9.532304 -35.57505 -2.83 0 -36.83 -2.83 8.799846 -32.84148 -4 9.835122 -36.70519 0
  [5,24,9.532304,-35.57505,-2.83,0,-36.83,-2.83,8.799846,-32.84148,-4,9.835122,-36.70519,0],
// 5 24 9.835122 -36.70519 0 0 -38 0 9.532304 -35.57505 -2.83 9.532304 -35.57505 2.83
  [5,24,9.835122,-36.70519,0,0,-38,0,9.532304,-35.57505,-2.83,9.532304,-35.57505,2.83],
// 5 24 9.532304 -35.57505 2.83 0 -36.83 2.83 9.835122 -36.70519 0 8.799846 -32.84148 4
  [5,24,9.532304,-35.57505,2.83,0,-36.83,2.83,9.835122,-36.70519,0,8.799846,-32.84148,4],
// 5 24 0 -30 -4 0 -30 -2 -7.76 -28.98 -4 7.76457 -28.97778 -4
  [5,24,0,-30,-4,0,-30,-2,-7.76,-28.98,-4,7.76457,-28.97778,-4],
// 5 24 0 -30 -2 0 -28.58 -1.42 -7.76 -28.98 -2 7.76457 -28.97778 -2
  [5,24,0,-30,-2,0,-28.58,-1.42,-7.76,-28.98,-2,7.76457,-28.97778,-2],
// 5 24 0 -28.58 -1.42 0 -28 0 -7.4 -27.61 -1.42 7.397047 -27.60617 -1.42
  [5,24,0,-28.58,-1.42,0,-28,0,-7.4,-27.61,-1.42,7.397047,-27.60617,-1.42],
// 5 24 0 -28 0 0 -28.58 1.42 -7.25 -27.05 0 7.246932 -27.04593 0
  [5,24,0,-28,0,0,-28.58,1.42,-7.25,-27.05,0,7.246932,-27.04593,0],
// 5 24 0 -28.58 1.42 0 -30 2 -7.4 -27.61 1.42 7.397047 -27.60617 1.42
  [5,24,0,-28.58,1.42,0,-30,2,-7.4,-27.61,1.42,7.397047,-27.60617,1.42],
// 5 24 0 -30 2 0 -30 4 -7.76 -28.98 2 7.76457 -28.97778 2
  [5,24,0,-30,2,0,-30,4,-7.76,-28.98,2,7.76457,-28.97778,2],
// 5 24 0 -34 -4 0 -36.83 -2.83 -8.8 -32.84 -4 8.799846 -32.84148 -4
  [5,24,0,-34,-4,0,-36.83,-2.83,-8.8,-32.84,-4,8.799846,-32.84148,-4],
// 5 24 0 -36.83 -2.83 0 -38 0 -9.53 -35.58 -2.83 9.532304 -35.57505 -2.83
  [5,24,0,-36.83,-2.83,0,-38,0,-9.53,-35.58,-2.83,9.532304,-35.57505,-2.83],
// 5 24 0 -38 0 0 -36.83 2.83 -9.84 -36.71 0 9.835122 -36.70519 0
  [5,24,0,-38,0,0,-36.83,2.83,-9.84,-36.71,0,9.835122,-36.70519,0],
// 5 24 0 -36.83 2.83 0 -34 4 -9.53 -35.58 2.83 9.532304 -35.57505 2.83
  [5,24,0,-36.83,2.83,0,-34,4,-9.53,-35.58,2.83,9.532304,-35.57505,2.83],
// 5 24 0 -34 -4 8.799846 -32.84148 -4 0 -30 -4 0 -36.83 -2.83
  [5,24,0,-34,-4,8.799846,-32.84148,-4,0,-30,-4,0,-36.83,-2.83],
// 5 24 8.799846 -32.84148 4 0 -34 4 7.76457 -28.97778 4 9.532304 -35.57505 2.83
  [5,24,8.799846,-32.84148,4,0,-34,4,7.76457,-28.97778,4,9.532304,-35.57505,2.83],
// 4 16 0 -30 -4 7.76457 -28.97778 -4 8.799846 -32.84148 -4 0 -34 -4
  [4,16,0,-30,-4,7.76457,-28.97778,-4,8.799846,-32.84148,-4,0,-34,-4],
// 4 16 8.799846 -32.84148 4 0 -34 4 0 -36.83 2.83 9.532304 -35.57505 2.83
  [4,16,8.799846,-32.84148,4,0,-34,4,0,-36.83,2.83,9.532304,-35.57505,2.83],
// 4 16 9.532304 -35.57505 2.83 0 -36.83 2.83 0 -38 0 9.835122 -36.70519 0
  [4,16,9.532304,-35.57505,2.83,0,-36.83,2.83,0,-38,0,9.835122,-36.70519,0],
// 4 16 9.835122 -36.70519 0 0 -38 0 0 -36.83 -2.83 9.532304 -35.57505 -2.83
  [4,16,9.835122,-36.70519,0,0,-38,0,0,-36.83,-2.83,9.532304,-35.57505,-2.83],
// 4 16 9.532304 -35.57505 -2.83 0 -36.83 -2.83 0 -34 -4 8.799846 -32.84148 -4
  [4,16,9.532304,-35.57505,-2.83,0,-36.83,-2.83,0,-34,-4,8.799846,-32.84148,-4],
// 
];
module ldraw_lib__s__2815s01(step=0, col=false, unit=2/5, alt=false, line=0.2, solid=!$preview)
    makepoly(ldraw_lib__s__2815s01(solid), step=step, col=col, unit=unit, alt=alt, line=line, solid=solid);
ldraw_lib__s__2815s01(line=0.2);
// file: 3004.scad
use <../lib.scad>
use <s/3004s01.scad>
$fa=1; $fs=0.2;
function ldraw_lib__3004(realsolid=false) = [
// 0 Brick  1 x  2
// 0 Name: 3004.dat
// 0 Author: James Jessiman
// 0 !LDRAW_ORG Part UPDATE 2022-05
// 0 !LICENSE Licensed under CC BY 2.0 and CC BY 4.0 : see CAreadme.txt
// 
// 0 BFC CERTIFY CCW
  [0,"BFC","CERTIFY"],
  [0,"BFC","CCW"],
// 
// 0 !HISTORY 2001-10-26 [PTadmin] Official Update 2001-01
// 0 !HISTORY 2002-05-07 {unknown} BFC Certification
// 0 !HISTORY 2002-06-11 [PTadmin] Official Update 2002-03
// 0 !HISTORY 2007-05-07 [PTadmin] Header formatted for Contributor Agreement
// 0 !HISTORY 2008-07-01 [PTadmin] Official Update 2008-01
// 0 !HISTORY 2022-08-04 [MagFors] Using subfile
// 0 !HISTORY 2022-09-15 [PTadmin] Official Update 2022-05
// 
// 
// 1 16 0 0 0 1 0 0 0 1 0 0 0 1 s\3004s01.dat
  [1,16,0,0,0,1,0,0,0,1,0,0,0,1, ldraw_lib__s__3004s01(realsolid)],
// 4 16 -20 24 -10 20 24 -10 20 0 -10 -20 0 -10
  [4,16,-20,24,-10,20,24,-10,20,0,-10,-20,0,-10],
];
module ldraw_lib__3004(step=0, col=false, unit=2/5, alt=false, line=0.2, solid=!$preview)
    makepoly(ldraw_lib__3004(solid), step=step, col=col, unit=unit, alt=alt, line=line, solid=solid);
ldraw_lib__3004(line=0.2);
// file: 2815.scad
use <../lib.scad>
use <s/2815s01.scad>
$fa=1; $fs=0.2;
function ldraw_lib__2815(realsolid=false) = [
// 0 Technic Wedge Belt Wheel Tyre
// 0 Name: 2815.dat
// 0 Author: James Jessiman
// 0 !LDRAW_ORG Part UPDATE 2012-01
// 0 !LICENSE Licensed under CC BY 2.0 and CC BY 4.0 : see CAreadme.txt
// 
// 0 BFC CERTIFY CCW
  [0,"BFC","CERTIFY"],
  [0,"BFC","CCW"],
// 
// 0 !HISTORY 2007-07-18 [PTadmin] Header formatted for Contributor Agreement
// 0 !HISTORY 2008-07-01 [PTadmin] Official Update 2008-01
// 0 !HISTORY 2008-07-07 [guyvivan] Made BFC Compliant (2004-08-04)
// 0 !HISTORY 2012-01-30 [cwdee] Renamed from 70162
// 0 !HISTORY 2012-03-30 [PTadmin] Official Update 2012-01
// 
// 
// 1 16 0 0 0 1 0 0 0 1 0 0 0 1 s\2815s01.dat
  [1,16,0,0,0,1,0,0,0,1,0,0,0,1, ldraw_lib__s__2815s01(realsolid)],
// 1 16 0 0 0 0 -1 0 1 0 0 0 0 1 s\2815s01.dat
  [1,16,0,0,0,0,-1,0,1,0,0,0,0,1, ldraw_lib__s__2815s01(realsolid)],
// 1 16 0 0 0 -1 0 0 0 -1 0 0 0 1 s\2815s01.dat
  [1,16,0,0,0,-1,0,0,0,-1,0,0,0,1, ldraw_lib__s__2815s01(realsolid)],
// 1 16 0 0 0 0 1 0 -1 0 0 0 0 1 s\2815s01.dat
  [1,16,0,0,0,0,1,0,-1,0,0,0,0,1, ldraw_lib__s__2815s01(realsolid)],
// 1 16 0 0 0 0.965926 -0.258819 0 0.258819 0.965926 0 0 0 1 s\2815s01.dat
  [1,16,0,0,0,0.965926,-0.258819,0,0.258819,0.965926,0,0,0,1, ldraw_lib__s__2815s01(realsolid)],
// 1 16 0 0 0 -0.258819 -0.965926 0 0.965926 -0.258819 0 0 0 1 s\2815s01.dat
  [1,16,0,0,0,-0.258819,-0.965926,0,0.965926,-0.258819,0,0,0,1, ldraw_lib__s__2815s01(realsolid)],
// 1 16 0 0 0 -0.965926 0.258819 0 -0.258819 -0.965926 0 0 0 1 s\2815s01.dat
  [1,16,0,0,0,-0.965926,0.258819,0,-0.258819,-0.965926,0,0,0,1, ldraw_lib__s__2815s01(realsolid)],
// 1 16 0 0 0 0.258819 0.965926 0 -0.965926 0.258819 0 0 0 1 s\2815s01.dat
  [1,16,0,0,0,0.258819,0.965926,0,-0.965926,0.258819,0,0,0,1, ldraw_lib__s__2815s01(realsolid)],
// 1 16 0 0 0 0.866025 -0.5 0 0.5 0.866025 0 0 0 1 s\2815s01.dat
  [1,16,0,0,0,0.866025,-0.5,0,0.5,0.866025,0,0,0,1, ldraw_lib__s__2815s01(realsolid)],
// 1 16 0 0 0 -0.5 -0.866025 0 0.866025 -0.5 0 0 0 1 s\2815s01.dat
  [1,16,0,0,0,-0.5,-0.866025,0,0.866025,-0.5,0,0,0,1, ldraw_lib__s__2815s01(realsolid)],
// 1 16 0 0 0 -0.866025 0.5 0 -0.5 -0.866025 0 0 0 1 s\2815s01.dat
  [1,16,0,0,0,-0.866025,0.5,0,-0.5,-0.866025,0,0,0,1, ldraw_lib__s__2815s01(realsolid)],
// 1 16 0 0 0 0.5 0.866025 0 -0.866025 0.5 0 0 0 1 s\2815s01.dat
  [1,16,0,0,0,0.5,0.866025,0,-0.866025,0.5,0,0,0,1, ldraw_lib__s__2815s01(realsolid)],
// 1 16 0 0 0 0.707107 -0.707107 0 0.707107 0.707107 0 0 0 1 s\2815s01.dat
  [1,16,0,0,0,0.707107,-0.707107,0,0.707107,0.707107,0,0,0,1, ldraw_lib__s__2815s01(realsolid)],
// 1 16 0 0 0 -0.707107 -0.707107 0 0.707107 -0.707107 0 0 0 1 s\2815s01.dat
  [1,16,0,0,0,-0.707107,-0.707107,0,0.707107,-0.707107,0,0,0,1, ldraw_lib__s__2815s01(realsolid)],
// 1 16 0 0 0 -0.707107 0.707107 0 -0.707107 -0.707107 0 0 0 1 s\2815s01.dat
  [1,16,0,0,0,-0.707107,0.707107,0,-0.707107,-0.707107,0,0,0,1, ldraw_lib__s__2815s01(realsolid)],
// 1 16 0 0 0 0.707107 0.707107 0 -0.707107 0.707107 0 0 0 1 s\2815s01.dat
  [1,16,0,0,0,0.707107,0.707107,0,-0.707107,0.707107,0,0,0,1, ldraw_lib__s__2815s01(realsolid)],
// 1 16 0 0 0 0.5 -0.866025 0 0.866025 0.5 0 0 0 1 s\2815s01.dat
  [1,16,0,0,0,0.5,-0.866025,0,0.866025,0.5,0,0,0,1, ldraw_lib__s__2815s01(realsolid)],
// 1 16 0 0 0 -0.866025 -0.5 0 0.5 -0.866025 0 0 0 1 s\2815s01.dat
  [1,16,0,0,0,-0.866025,-0.5,0,0.5,-0.866025,0,0,0,1, ldraw_lib__s__2815s01(realsolid)],
// 1 16 0 0 0 -0.5 0.866025 0 -0.866025 -0.5 0 0 0 1 s\2815s01.dat
  [1,16,0,0,0,-0.5,0.866025,0,-0.866025,-0.5,0,0,0,1, ldraw_lib__s__2815s01(realsolid)],
// 1 16 0 0 0 0.866025 0.5 0 -0.5 0.866025 0 0 0 1 s\2815s01.dat
  [1,16,0,0,0,0.866025,0.5,0,-0.5,0.866025,0,0,0,1, ldraw_lib__s__2815s01(realsolid)],
// 1 16 0 0 0 0.258819 -0.965926 0 0.965926 0.258819 0 0 0 1 s\2815s01.dat
  [1,16,0,0,0,0.258819,-0.965926,0,0.965926,0.258819,0,0,0,1, ldraw_lib__s__2815s01(realsolid)],
// 1 16 0 0 0 -0.965926 -0.258819 0 0.258819 -0.965926 0 0 0 1 s\2815s01.dat
  [1,16,0,0,0,-0.965926,-0.258819,0,0.258819,-0.965926,0,0,0,1, ldraw_lib__s__2815s01(realsolid)],
// 1 16 0 0 0 -0.258819 0.965926 0 -0.965926 -0.258819 0 0 0 1 s\2815s01.dat
  [1,16,0,0,0,-0.258819,0.965926,0,-0.965926,-0.258819,0,0,0,1, ldraw_lib__s__2815s01(realsolid)],
// 1 16 0 0 0 0.965926 0.258819 0 -0.258819 0.965926 0 0 0 1 s\2815s01.dat
  [1,16,0,0,0,0.965926,0.258819,0,-0.258819,0.965926,0,0,0,1, ldraw_lib__s__2815s01(realsolid)],
// 0
];
module ldraw_lib__2815(step=0, col=false, unit=2/5, alt=false, line=0.2, solid=!$preview)
    makepoly(ldraw_lib__2815(solid), step=step, col=col, unit=unit, alt=alt, line=line, solid=solid);
ldraw_lib__2815(line=0.2);
// main file
use <../lib.scad>
use <2815.scad>
$fa=1; $fs=0.2;
function ldraw_lib__70162(realsolid=false) = [
// 0 ~Moved to 2815
// 0 Name: 70162.dat
// 0 Author: [PTadmin]
// 0 !LDRAW_ORG Part UPDATE 2012-01
// 0 !LICENSE Licensed under CC BY 4.0 : see CAreadme.txt
// 
// 0 BFC CERTIFY CCW
  [0,"BFC","CERTIFY"],
  [0,"BFC","CCW"],
// 
// 0 !HISTORY 2012-03-30 [PTadmin] Official Update 2012-01
// 
// 
// 0 // Technic Wedge Belt Wheel Tyre
// 1 16 0 0 0 1 0 0 0 1 0 0 0 1 2815.dat
  [1,16,0,0,0,1,0,0,0,1,0,0,0,1, ldraw_lib__2815(realsolid)],
];
module ldraw_lib__70162(step=0, col=false, unit=2/5, alt=false, line=0.2, solid=!$preview)
    makepoly(ldraw_lib__70162(solid), step=step, col=col, unit=unit, alt=alt, line=line, solid=solid);
ldraw_lib__70162(line=0.2);
